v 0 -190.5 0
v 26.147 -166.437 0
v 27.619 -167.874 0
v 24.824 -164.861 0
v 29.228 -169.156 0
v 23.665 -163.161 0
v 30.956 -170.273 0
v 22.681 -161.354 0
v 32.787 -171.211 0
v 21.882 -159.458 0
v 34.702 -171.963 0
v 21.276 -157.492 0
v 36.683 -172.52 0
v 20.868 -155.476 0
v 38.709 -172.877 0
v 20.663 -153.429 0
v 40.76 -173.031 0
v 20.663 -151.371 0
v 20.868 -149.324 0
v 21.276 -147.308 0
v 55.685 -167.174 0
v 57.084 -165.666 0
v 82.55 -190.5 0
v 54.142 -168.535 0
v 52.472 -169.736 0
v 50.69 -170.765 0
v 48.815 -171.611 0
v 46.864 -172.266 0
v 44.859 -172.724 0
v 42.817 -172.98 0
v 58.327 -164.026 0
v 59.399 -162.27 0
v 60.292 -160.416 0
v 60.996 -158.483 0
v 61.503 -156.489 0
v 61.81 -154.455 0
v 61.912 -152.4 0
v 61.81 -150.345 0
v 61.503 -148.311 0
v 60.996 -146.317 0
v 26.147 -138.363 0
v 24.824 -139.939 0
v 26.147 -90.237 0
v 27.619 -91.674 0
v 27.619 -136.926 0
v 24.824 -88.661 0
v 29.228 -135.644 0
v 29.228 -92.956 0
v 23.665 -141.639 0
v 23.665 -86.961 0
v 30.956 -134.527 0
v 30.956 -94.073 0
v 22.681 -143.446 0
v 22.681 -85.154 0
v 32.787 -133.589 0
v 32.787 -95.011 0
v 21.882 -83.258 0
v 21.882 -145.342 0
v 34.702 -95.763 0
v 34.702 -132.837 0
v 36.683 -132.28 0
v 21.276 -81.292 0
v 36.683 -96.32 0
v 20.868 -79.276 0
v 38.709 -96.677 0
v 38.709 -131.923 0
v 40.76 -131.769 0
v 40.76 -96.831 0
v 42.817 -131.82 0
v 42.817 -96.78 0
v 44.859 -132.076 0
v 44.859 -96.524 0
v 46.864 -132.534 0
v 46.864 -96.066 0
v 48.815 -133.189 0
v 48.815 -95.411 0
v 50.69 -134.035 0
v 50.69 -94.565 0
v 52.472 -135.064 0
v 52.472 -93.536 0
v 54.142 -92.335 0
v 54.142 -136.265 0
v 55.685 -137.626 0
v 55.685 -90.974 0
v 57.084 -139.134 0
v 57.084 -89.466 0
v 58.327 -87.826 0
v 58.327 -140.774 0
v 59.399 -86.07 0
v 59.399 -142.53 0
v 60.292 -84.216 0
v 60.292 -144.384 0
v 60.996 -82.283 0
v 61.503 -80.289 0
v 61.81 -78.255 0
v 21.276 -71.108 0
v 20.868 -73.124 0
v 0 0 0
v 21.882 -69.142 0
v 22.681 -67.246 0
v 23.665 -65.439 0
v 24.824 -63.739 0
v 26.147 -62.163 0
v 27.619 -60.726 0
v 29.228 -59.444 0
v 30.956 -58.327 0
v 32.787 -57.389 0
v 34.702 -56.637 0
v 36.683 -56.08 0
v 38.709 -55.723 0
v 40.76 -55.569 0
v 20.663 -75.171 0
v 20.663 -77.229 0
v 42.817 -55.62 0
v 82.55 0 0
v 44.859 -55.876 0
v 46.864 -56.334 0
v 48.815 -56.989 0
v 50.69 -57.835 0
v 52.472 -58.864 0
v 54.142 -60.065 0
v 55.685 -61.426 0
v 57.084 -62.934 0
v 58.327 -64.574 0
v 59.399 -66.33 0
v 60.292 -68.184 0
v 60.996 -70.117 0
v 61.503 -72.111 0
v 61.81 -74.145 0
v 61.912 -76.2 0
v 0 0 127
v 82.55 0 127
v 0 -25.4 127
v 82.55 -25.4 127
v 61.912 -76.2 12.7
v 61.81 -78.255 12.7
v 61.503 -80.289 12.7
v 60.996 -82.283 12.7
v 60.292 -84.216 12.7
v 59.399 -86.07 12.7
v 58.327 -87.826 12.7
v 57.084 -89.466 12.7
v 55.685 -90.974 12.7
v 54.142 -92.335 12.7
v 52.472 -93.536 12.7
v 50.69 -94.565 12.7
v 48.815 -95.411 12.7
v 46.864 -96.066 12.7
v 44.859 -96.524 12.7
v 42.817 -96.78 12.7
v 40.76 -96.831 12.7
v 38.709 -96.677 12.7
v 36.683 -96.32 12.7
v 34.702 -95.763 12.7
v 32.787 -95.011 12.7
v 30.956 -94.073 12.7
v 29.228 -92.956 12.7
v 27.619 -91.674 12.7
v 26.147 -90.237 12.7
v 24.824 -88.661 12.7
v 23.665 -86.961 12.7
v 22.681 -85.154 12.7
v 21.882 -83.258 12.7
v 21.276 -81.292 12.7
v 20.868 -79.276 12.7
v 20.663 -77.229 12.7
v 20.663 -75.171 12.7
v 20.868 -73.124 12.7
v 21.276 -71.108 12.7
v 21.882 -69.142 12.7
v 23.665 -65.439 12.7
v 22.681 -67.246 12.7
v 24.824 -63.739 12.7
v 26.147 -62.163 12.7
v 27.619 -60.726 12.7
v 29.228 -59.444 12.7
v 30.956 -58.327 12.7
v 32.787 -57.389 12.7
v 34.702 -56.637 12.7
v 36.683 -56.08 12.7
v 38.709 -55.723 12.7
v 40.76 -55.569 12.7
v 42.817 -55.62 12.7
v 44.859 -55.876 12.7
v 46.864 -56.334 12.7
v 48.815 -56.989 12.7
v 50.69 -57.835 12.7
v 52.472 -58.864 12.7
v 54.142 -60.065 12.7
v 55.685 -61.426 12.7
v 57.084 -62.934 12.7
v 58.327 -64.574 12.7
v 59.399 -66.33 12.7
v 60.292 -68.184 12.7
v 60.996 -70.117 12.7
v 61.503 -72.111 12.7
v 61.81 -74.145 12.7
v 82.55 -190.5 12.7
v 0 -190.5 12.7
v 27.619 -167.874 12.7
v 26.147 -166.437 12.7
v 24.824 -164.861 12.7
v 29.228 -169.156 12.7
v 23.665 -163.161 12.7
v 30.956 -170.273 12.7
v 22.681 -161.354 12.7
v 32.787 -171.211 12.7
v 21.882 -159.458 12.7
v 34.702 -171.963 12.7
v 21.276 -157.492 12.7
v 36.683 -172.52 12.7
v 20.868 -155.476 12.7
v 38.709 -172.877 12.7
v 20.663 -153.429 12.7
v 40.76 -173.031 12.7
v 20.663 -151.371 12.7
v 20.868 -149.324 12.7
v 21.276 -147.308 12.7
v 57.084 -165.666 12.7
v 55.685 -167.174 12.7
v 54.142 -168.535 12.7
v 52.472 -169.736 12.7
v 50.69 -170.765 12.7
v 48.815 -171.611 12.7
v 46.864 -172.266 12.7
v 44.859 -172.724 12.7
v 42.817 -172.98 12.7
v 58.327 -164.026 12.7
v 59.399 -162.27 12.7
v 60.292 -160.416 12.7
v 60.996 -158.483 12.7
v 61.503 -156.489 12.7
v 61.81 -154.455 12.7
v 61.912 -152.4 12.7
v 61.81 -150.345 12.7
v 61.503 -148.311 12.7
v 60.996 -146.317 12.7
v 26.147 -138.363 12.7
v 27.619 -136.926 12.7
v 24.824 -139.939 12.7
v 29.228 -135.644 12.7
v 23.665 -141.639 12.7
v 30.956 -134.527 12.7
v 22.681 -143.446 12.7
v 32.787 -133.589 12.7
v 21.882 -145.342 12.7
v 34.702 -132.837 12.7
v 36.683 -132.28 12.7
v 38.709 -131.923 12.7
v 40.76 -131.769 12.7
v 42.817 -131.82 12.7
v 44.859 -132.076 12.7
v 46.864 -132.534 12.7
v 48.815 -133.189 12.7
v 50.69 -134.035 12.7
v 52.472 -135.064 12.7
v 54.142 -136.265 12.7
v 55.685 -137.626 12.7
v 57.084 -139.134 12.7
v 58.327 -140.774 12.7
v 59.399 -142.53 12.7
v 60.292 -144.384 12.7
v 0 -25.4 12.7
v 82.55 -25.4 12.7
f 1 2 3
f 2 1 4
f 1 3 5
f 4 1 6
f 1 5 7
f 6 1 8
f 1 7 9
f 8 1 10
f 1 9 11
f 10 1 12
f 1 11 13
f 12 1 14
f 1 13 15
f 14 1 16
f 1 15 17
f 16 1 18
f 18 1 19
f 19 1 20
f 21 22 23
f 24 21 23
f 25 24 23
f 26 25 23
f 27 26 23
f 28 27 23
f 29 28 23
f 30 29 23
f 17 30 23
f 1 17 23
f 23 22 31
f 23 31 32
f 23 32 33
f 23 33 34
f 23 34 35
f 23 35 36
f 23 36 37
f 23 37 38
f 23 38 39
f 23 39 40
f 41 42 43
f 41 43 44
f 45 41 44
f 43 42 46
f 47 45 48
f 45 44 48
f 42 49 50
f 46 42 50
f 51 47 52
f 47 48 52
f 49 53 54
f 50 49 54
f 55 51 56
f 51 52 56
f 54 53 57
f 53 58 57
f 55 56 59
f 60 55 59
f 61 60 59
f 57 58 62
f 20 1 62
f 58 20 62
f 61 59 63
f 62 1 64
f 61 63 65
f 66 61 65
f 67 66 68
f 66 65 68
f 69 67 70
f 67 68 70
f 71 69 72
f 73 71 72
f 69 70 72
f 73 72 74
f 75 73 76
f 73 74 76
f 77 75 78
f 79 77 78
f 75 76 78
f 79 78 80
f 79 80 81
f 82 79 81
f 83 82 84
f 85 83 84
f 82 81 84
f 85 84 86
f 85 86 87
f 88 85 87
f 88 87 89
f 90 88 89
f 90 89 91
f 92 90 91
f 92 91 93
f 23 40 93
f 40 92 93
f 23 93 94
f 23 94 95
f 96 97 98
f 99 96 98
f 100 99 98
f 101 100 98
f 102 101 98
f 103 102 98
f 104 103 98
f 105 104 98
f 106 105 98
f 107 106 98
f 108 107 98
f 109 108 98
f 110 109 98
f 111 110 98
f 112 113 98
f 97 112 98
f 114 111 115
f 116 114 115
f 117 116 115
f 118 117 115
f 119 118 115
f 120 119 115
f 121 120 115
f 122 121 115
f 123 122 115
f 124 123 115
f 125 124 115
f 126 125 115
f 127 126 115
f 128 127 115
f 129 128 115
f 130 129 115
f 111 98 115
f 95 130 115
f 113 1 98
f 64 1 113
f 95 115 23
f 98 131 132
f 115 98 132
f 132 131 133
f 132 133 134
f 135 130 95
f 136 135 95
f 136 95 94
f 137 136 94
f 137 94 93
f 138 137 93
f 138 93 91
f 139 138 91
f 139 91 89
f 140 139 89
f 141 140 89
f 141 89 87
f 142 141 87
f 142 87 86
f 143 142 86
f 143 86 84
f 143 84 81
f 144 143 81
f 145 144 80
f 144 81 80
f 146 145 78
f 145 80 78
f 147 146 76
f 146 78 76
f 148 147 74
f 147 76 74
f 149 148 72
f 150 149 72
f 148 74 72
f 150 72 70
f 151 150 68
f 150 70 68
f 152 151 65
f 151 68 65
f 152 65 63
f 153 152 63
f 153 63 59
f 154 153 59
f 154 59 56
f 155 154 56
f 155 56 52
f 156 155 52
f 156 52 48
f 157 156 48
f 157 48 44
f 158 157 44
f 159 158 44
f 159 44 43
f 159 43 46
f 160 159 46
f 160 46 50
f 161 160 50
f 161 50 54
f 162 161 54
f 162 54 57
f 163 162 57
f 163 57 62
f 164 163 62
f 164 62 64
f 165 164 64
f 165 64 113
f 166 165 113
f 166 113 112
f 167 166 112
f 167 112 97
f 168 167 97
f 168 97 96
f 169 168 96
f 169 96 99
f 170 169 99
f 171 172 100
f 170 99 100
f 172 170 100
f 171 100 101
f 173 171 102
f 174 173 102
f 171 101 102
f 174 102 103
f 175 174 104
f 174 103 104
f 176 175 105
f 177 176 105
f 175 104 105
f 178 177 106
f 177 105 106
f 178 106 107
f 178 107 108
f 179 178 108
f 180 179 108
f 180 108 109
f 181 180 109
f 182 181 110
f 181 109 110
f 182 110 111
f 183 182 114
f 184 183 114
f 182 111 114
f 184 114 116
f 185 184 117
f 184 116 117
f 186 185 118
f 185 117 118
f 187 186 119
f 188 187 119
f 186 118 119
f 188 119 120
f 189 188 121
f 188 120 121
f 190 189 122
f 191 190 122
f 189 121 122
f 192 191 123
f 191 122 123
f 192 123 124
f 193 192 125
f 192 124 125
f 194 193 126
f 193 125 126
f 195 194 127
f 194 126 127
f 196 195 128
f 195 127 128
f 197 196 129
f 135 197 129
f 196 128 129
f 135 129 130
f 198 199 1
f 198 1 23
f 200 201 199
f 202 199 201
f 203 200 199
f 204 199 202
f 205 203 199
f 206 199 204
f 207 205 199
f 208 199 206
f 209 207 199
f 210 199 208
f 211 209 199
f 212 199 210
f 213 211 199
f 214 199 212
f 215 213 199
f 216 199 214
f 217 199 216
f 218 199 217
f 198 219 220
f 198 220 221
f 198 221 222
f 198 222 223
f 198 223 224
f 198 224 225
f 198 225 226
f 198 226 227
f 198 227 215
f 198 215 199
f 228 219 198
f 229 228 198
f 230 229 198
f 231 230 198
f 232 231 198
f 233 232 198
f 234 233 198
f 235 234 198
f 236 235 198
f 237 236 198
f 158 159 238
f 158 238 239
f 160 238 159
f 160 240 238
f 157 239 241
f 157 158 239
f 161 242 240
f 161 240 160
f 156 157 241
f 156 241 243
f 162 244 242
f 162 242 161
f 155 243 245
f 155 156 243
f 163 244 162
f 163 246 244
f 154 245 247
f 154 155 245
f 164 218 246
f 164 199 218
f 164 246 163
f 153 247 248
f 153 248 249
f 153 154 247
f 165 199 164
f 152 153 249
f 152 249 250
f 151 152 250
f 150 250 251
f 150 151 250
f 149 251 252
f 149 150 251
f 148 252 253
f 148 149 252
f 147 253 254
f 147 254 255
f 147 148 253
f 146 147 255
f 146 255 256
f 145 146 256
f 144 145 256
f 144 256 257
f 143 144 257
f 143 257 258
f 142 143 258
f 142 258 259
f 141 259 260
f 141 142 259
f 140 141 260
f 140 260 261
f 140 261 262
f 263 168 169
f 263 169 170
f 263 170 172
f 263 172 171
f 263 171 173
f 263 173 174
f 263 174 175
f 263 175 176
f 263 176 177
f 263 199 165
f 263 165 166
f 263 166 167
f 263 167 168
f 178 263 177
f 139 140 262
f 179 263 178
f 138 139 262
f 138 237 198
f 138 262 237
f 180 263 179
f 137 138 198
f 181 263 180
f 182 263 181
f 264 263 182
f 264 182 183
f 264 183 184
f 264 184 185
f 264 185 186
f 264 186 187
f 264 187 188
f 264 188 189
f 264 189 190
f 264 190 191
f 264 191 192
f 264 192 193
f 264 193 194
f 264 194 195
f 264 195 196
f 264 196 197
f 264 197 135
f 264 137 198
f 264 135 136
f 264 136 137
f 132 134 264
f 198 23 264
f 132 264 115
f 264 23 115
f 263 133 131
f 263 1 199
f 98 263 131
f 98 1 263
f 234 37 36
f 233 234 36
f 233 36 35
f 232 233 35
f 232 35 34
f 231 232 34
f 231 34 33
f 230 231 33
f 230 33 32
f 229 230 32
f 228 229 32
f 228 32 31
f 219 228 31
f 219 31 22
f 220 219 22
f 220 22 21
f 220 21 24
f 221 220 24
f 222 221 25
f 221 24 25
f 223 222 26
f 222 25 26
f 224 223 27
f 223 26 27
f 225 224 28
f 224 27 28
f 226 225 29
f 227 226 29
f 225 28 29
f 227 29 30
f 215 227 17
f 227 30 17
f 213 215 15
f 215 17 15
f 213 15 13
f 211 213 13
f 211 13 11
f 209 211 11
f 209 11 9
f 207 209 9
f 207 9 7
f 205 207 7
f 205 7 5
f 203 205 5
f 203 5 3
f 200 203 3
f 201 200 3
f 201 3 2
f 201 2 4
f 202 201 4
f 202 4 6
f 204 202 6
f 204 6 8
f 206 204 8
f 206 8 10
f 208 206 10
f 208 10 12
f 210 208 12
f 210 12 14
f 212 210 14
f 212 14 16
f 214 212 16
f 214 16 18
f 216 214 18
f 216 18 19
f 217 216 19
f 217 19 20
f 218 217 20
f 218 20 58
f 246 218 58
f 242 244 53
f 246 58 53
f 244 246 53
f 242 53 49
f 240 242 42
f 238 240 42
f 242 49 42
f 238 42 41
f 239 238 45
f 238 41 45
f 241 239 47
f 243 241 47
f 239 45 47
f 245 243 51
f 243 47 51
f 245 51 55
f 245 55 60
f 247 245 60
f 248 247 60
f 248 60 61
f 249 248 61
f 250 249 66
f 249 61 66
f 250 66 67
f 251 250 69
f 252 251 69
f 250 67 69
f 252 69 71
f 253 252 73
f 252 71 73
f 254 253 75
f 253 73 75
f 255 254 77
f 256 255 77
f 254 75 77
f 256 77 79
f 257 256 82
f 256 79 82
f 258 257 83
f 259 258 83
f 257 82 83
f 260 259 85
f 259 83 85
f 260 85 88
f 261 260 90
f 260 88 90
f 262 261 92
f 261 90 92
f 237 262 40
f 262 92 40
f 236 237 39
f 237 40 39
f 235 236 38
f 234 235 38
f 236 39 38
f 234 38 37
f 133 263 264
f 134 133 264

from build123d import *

# Parameters (mm, degrees)
F0_W     = 82.55
F0_H     = 12.7
F1_DEPTH = 190.5
F2_R     = 20.6375
F4_DEPTH = 25.4
F5_W     = 82.55
F5_H     = 25.4
F7_DEPTH = 114.3


with BuildPart() as f1:
    # F0 (on Front) → F1 (new body)
    with BuildSketch(Plane.XZ):
        with Locations((41.275, 6.35)):
            Rectangle(F0_W, F0_H)
    extrude(amount=F1_DEPTH)

    # F2 (on face) → F4 (cut)
    with BuildSketch(Plane(origin=(0, 0, 0), x_dir=(1, 0, 0), z_dir=(0, 0, -1))):
        with Locations((41.275, 76.2)):
            Circle(F2_R)
        with Locations((41.275, 152.4)):
            Circle(F2_R)
    extrude(amount=-F4_DEPTH, mode=Mode.SUBTRACT)

    # F5 (on face) → F7 (join)
    with BuildSketch(Plane.XY.offset(12.7)):
        with Locations((41.275, -12.7)):
            Rectangle(F5_W, F5_H)
    extrude(amount=F7_DEPTH)


solid = f1.part
